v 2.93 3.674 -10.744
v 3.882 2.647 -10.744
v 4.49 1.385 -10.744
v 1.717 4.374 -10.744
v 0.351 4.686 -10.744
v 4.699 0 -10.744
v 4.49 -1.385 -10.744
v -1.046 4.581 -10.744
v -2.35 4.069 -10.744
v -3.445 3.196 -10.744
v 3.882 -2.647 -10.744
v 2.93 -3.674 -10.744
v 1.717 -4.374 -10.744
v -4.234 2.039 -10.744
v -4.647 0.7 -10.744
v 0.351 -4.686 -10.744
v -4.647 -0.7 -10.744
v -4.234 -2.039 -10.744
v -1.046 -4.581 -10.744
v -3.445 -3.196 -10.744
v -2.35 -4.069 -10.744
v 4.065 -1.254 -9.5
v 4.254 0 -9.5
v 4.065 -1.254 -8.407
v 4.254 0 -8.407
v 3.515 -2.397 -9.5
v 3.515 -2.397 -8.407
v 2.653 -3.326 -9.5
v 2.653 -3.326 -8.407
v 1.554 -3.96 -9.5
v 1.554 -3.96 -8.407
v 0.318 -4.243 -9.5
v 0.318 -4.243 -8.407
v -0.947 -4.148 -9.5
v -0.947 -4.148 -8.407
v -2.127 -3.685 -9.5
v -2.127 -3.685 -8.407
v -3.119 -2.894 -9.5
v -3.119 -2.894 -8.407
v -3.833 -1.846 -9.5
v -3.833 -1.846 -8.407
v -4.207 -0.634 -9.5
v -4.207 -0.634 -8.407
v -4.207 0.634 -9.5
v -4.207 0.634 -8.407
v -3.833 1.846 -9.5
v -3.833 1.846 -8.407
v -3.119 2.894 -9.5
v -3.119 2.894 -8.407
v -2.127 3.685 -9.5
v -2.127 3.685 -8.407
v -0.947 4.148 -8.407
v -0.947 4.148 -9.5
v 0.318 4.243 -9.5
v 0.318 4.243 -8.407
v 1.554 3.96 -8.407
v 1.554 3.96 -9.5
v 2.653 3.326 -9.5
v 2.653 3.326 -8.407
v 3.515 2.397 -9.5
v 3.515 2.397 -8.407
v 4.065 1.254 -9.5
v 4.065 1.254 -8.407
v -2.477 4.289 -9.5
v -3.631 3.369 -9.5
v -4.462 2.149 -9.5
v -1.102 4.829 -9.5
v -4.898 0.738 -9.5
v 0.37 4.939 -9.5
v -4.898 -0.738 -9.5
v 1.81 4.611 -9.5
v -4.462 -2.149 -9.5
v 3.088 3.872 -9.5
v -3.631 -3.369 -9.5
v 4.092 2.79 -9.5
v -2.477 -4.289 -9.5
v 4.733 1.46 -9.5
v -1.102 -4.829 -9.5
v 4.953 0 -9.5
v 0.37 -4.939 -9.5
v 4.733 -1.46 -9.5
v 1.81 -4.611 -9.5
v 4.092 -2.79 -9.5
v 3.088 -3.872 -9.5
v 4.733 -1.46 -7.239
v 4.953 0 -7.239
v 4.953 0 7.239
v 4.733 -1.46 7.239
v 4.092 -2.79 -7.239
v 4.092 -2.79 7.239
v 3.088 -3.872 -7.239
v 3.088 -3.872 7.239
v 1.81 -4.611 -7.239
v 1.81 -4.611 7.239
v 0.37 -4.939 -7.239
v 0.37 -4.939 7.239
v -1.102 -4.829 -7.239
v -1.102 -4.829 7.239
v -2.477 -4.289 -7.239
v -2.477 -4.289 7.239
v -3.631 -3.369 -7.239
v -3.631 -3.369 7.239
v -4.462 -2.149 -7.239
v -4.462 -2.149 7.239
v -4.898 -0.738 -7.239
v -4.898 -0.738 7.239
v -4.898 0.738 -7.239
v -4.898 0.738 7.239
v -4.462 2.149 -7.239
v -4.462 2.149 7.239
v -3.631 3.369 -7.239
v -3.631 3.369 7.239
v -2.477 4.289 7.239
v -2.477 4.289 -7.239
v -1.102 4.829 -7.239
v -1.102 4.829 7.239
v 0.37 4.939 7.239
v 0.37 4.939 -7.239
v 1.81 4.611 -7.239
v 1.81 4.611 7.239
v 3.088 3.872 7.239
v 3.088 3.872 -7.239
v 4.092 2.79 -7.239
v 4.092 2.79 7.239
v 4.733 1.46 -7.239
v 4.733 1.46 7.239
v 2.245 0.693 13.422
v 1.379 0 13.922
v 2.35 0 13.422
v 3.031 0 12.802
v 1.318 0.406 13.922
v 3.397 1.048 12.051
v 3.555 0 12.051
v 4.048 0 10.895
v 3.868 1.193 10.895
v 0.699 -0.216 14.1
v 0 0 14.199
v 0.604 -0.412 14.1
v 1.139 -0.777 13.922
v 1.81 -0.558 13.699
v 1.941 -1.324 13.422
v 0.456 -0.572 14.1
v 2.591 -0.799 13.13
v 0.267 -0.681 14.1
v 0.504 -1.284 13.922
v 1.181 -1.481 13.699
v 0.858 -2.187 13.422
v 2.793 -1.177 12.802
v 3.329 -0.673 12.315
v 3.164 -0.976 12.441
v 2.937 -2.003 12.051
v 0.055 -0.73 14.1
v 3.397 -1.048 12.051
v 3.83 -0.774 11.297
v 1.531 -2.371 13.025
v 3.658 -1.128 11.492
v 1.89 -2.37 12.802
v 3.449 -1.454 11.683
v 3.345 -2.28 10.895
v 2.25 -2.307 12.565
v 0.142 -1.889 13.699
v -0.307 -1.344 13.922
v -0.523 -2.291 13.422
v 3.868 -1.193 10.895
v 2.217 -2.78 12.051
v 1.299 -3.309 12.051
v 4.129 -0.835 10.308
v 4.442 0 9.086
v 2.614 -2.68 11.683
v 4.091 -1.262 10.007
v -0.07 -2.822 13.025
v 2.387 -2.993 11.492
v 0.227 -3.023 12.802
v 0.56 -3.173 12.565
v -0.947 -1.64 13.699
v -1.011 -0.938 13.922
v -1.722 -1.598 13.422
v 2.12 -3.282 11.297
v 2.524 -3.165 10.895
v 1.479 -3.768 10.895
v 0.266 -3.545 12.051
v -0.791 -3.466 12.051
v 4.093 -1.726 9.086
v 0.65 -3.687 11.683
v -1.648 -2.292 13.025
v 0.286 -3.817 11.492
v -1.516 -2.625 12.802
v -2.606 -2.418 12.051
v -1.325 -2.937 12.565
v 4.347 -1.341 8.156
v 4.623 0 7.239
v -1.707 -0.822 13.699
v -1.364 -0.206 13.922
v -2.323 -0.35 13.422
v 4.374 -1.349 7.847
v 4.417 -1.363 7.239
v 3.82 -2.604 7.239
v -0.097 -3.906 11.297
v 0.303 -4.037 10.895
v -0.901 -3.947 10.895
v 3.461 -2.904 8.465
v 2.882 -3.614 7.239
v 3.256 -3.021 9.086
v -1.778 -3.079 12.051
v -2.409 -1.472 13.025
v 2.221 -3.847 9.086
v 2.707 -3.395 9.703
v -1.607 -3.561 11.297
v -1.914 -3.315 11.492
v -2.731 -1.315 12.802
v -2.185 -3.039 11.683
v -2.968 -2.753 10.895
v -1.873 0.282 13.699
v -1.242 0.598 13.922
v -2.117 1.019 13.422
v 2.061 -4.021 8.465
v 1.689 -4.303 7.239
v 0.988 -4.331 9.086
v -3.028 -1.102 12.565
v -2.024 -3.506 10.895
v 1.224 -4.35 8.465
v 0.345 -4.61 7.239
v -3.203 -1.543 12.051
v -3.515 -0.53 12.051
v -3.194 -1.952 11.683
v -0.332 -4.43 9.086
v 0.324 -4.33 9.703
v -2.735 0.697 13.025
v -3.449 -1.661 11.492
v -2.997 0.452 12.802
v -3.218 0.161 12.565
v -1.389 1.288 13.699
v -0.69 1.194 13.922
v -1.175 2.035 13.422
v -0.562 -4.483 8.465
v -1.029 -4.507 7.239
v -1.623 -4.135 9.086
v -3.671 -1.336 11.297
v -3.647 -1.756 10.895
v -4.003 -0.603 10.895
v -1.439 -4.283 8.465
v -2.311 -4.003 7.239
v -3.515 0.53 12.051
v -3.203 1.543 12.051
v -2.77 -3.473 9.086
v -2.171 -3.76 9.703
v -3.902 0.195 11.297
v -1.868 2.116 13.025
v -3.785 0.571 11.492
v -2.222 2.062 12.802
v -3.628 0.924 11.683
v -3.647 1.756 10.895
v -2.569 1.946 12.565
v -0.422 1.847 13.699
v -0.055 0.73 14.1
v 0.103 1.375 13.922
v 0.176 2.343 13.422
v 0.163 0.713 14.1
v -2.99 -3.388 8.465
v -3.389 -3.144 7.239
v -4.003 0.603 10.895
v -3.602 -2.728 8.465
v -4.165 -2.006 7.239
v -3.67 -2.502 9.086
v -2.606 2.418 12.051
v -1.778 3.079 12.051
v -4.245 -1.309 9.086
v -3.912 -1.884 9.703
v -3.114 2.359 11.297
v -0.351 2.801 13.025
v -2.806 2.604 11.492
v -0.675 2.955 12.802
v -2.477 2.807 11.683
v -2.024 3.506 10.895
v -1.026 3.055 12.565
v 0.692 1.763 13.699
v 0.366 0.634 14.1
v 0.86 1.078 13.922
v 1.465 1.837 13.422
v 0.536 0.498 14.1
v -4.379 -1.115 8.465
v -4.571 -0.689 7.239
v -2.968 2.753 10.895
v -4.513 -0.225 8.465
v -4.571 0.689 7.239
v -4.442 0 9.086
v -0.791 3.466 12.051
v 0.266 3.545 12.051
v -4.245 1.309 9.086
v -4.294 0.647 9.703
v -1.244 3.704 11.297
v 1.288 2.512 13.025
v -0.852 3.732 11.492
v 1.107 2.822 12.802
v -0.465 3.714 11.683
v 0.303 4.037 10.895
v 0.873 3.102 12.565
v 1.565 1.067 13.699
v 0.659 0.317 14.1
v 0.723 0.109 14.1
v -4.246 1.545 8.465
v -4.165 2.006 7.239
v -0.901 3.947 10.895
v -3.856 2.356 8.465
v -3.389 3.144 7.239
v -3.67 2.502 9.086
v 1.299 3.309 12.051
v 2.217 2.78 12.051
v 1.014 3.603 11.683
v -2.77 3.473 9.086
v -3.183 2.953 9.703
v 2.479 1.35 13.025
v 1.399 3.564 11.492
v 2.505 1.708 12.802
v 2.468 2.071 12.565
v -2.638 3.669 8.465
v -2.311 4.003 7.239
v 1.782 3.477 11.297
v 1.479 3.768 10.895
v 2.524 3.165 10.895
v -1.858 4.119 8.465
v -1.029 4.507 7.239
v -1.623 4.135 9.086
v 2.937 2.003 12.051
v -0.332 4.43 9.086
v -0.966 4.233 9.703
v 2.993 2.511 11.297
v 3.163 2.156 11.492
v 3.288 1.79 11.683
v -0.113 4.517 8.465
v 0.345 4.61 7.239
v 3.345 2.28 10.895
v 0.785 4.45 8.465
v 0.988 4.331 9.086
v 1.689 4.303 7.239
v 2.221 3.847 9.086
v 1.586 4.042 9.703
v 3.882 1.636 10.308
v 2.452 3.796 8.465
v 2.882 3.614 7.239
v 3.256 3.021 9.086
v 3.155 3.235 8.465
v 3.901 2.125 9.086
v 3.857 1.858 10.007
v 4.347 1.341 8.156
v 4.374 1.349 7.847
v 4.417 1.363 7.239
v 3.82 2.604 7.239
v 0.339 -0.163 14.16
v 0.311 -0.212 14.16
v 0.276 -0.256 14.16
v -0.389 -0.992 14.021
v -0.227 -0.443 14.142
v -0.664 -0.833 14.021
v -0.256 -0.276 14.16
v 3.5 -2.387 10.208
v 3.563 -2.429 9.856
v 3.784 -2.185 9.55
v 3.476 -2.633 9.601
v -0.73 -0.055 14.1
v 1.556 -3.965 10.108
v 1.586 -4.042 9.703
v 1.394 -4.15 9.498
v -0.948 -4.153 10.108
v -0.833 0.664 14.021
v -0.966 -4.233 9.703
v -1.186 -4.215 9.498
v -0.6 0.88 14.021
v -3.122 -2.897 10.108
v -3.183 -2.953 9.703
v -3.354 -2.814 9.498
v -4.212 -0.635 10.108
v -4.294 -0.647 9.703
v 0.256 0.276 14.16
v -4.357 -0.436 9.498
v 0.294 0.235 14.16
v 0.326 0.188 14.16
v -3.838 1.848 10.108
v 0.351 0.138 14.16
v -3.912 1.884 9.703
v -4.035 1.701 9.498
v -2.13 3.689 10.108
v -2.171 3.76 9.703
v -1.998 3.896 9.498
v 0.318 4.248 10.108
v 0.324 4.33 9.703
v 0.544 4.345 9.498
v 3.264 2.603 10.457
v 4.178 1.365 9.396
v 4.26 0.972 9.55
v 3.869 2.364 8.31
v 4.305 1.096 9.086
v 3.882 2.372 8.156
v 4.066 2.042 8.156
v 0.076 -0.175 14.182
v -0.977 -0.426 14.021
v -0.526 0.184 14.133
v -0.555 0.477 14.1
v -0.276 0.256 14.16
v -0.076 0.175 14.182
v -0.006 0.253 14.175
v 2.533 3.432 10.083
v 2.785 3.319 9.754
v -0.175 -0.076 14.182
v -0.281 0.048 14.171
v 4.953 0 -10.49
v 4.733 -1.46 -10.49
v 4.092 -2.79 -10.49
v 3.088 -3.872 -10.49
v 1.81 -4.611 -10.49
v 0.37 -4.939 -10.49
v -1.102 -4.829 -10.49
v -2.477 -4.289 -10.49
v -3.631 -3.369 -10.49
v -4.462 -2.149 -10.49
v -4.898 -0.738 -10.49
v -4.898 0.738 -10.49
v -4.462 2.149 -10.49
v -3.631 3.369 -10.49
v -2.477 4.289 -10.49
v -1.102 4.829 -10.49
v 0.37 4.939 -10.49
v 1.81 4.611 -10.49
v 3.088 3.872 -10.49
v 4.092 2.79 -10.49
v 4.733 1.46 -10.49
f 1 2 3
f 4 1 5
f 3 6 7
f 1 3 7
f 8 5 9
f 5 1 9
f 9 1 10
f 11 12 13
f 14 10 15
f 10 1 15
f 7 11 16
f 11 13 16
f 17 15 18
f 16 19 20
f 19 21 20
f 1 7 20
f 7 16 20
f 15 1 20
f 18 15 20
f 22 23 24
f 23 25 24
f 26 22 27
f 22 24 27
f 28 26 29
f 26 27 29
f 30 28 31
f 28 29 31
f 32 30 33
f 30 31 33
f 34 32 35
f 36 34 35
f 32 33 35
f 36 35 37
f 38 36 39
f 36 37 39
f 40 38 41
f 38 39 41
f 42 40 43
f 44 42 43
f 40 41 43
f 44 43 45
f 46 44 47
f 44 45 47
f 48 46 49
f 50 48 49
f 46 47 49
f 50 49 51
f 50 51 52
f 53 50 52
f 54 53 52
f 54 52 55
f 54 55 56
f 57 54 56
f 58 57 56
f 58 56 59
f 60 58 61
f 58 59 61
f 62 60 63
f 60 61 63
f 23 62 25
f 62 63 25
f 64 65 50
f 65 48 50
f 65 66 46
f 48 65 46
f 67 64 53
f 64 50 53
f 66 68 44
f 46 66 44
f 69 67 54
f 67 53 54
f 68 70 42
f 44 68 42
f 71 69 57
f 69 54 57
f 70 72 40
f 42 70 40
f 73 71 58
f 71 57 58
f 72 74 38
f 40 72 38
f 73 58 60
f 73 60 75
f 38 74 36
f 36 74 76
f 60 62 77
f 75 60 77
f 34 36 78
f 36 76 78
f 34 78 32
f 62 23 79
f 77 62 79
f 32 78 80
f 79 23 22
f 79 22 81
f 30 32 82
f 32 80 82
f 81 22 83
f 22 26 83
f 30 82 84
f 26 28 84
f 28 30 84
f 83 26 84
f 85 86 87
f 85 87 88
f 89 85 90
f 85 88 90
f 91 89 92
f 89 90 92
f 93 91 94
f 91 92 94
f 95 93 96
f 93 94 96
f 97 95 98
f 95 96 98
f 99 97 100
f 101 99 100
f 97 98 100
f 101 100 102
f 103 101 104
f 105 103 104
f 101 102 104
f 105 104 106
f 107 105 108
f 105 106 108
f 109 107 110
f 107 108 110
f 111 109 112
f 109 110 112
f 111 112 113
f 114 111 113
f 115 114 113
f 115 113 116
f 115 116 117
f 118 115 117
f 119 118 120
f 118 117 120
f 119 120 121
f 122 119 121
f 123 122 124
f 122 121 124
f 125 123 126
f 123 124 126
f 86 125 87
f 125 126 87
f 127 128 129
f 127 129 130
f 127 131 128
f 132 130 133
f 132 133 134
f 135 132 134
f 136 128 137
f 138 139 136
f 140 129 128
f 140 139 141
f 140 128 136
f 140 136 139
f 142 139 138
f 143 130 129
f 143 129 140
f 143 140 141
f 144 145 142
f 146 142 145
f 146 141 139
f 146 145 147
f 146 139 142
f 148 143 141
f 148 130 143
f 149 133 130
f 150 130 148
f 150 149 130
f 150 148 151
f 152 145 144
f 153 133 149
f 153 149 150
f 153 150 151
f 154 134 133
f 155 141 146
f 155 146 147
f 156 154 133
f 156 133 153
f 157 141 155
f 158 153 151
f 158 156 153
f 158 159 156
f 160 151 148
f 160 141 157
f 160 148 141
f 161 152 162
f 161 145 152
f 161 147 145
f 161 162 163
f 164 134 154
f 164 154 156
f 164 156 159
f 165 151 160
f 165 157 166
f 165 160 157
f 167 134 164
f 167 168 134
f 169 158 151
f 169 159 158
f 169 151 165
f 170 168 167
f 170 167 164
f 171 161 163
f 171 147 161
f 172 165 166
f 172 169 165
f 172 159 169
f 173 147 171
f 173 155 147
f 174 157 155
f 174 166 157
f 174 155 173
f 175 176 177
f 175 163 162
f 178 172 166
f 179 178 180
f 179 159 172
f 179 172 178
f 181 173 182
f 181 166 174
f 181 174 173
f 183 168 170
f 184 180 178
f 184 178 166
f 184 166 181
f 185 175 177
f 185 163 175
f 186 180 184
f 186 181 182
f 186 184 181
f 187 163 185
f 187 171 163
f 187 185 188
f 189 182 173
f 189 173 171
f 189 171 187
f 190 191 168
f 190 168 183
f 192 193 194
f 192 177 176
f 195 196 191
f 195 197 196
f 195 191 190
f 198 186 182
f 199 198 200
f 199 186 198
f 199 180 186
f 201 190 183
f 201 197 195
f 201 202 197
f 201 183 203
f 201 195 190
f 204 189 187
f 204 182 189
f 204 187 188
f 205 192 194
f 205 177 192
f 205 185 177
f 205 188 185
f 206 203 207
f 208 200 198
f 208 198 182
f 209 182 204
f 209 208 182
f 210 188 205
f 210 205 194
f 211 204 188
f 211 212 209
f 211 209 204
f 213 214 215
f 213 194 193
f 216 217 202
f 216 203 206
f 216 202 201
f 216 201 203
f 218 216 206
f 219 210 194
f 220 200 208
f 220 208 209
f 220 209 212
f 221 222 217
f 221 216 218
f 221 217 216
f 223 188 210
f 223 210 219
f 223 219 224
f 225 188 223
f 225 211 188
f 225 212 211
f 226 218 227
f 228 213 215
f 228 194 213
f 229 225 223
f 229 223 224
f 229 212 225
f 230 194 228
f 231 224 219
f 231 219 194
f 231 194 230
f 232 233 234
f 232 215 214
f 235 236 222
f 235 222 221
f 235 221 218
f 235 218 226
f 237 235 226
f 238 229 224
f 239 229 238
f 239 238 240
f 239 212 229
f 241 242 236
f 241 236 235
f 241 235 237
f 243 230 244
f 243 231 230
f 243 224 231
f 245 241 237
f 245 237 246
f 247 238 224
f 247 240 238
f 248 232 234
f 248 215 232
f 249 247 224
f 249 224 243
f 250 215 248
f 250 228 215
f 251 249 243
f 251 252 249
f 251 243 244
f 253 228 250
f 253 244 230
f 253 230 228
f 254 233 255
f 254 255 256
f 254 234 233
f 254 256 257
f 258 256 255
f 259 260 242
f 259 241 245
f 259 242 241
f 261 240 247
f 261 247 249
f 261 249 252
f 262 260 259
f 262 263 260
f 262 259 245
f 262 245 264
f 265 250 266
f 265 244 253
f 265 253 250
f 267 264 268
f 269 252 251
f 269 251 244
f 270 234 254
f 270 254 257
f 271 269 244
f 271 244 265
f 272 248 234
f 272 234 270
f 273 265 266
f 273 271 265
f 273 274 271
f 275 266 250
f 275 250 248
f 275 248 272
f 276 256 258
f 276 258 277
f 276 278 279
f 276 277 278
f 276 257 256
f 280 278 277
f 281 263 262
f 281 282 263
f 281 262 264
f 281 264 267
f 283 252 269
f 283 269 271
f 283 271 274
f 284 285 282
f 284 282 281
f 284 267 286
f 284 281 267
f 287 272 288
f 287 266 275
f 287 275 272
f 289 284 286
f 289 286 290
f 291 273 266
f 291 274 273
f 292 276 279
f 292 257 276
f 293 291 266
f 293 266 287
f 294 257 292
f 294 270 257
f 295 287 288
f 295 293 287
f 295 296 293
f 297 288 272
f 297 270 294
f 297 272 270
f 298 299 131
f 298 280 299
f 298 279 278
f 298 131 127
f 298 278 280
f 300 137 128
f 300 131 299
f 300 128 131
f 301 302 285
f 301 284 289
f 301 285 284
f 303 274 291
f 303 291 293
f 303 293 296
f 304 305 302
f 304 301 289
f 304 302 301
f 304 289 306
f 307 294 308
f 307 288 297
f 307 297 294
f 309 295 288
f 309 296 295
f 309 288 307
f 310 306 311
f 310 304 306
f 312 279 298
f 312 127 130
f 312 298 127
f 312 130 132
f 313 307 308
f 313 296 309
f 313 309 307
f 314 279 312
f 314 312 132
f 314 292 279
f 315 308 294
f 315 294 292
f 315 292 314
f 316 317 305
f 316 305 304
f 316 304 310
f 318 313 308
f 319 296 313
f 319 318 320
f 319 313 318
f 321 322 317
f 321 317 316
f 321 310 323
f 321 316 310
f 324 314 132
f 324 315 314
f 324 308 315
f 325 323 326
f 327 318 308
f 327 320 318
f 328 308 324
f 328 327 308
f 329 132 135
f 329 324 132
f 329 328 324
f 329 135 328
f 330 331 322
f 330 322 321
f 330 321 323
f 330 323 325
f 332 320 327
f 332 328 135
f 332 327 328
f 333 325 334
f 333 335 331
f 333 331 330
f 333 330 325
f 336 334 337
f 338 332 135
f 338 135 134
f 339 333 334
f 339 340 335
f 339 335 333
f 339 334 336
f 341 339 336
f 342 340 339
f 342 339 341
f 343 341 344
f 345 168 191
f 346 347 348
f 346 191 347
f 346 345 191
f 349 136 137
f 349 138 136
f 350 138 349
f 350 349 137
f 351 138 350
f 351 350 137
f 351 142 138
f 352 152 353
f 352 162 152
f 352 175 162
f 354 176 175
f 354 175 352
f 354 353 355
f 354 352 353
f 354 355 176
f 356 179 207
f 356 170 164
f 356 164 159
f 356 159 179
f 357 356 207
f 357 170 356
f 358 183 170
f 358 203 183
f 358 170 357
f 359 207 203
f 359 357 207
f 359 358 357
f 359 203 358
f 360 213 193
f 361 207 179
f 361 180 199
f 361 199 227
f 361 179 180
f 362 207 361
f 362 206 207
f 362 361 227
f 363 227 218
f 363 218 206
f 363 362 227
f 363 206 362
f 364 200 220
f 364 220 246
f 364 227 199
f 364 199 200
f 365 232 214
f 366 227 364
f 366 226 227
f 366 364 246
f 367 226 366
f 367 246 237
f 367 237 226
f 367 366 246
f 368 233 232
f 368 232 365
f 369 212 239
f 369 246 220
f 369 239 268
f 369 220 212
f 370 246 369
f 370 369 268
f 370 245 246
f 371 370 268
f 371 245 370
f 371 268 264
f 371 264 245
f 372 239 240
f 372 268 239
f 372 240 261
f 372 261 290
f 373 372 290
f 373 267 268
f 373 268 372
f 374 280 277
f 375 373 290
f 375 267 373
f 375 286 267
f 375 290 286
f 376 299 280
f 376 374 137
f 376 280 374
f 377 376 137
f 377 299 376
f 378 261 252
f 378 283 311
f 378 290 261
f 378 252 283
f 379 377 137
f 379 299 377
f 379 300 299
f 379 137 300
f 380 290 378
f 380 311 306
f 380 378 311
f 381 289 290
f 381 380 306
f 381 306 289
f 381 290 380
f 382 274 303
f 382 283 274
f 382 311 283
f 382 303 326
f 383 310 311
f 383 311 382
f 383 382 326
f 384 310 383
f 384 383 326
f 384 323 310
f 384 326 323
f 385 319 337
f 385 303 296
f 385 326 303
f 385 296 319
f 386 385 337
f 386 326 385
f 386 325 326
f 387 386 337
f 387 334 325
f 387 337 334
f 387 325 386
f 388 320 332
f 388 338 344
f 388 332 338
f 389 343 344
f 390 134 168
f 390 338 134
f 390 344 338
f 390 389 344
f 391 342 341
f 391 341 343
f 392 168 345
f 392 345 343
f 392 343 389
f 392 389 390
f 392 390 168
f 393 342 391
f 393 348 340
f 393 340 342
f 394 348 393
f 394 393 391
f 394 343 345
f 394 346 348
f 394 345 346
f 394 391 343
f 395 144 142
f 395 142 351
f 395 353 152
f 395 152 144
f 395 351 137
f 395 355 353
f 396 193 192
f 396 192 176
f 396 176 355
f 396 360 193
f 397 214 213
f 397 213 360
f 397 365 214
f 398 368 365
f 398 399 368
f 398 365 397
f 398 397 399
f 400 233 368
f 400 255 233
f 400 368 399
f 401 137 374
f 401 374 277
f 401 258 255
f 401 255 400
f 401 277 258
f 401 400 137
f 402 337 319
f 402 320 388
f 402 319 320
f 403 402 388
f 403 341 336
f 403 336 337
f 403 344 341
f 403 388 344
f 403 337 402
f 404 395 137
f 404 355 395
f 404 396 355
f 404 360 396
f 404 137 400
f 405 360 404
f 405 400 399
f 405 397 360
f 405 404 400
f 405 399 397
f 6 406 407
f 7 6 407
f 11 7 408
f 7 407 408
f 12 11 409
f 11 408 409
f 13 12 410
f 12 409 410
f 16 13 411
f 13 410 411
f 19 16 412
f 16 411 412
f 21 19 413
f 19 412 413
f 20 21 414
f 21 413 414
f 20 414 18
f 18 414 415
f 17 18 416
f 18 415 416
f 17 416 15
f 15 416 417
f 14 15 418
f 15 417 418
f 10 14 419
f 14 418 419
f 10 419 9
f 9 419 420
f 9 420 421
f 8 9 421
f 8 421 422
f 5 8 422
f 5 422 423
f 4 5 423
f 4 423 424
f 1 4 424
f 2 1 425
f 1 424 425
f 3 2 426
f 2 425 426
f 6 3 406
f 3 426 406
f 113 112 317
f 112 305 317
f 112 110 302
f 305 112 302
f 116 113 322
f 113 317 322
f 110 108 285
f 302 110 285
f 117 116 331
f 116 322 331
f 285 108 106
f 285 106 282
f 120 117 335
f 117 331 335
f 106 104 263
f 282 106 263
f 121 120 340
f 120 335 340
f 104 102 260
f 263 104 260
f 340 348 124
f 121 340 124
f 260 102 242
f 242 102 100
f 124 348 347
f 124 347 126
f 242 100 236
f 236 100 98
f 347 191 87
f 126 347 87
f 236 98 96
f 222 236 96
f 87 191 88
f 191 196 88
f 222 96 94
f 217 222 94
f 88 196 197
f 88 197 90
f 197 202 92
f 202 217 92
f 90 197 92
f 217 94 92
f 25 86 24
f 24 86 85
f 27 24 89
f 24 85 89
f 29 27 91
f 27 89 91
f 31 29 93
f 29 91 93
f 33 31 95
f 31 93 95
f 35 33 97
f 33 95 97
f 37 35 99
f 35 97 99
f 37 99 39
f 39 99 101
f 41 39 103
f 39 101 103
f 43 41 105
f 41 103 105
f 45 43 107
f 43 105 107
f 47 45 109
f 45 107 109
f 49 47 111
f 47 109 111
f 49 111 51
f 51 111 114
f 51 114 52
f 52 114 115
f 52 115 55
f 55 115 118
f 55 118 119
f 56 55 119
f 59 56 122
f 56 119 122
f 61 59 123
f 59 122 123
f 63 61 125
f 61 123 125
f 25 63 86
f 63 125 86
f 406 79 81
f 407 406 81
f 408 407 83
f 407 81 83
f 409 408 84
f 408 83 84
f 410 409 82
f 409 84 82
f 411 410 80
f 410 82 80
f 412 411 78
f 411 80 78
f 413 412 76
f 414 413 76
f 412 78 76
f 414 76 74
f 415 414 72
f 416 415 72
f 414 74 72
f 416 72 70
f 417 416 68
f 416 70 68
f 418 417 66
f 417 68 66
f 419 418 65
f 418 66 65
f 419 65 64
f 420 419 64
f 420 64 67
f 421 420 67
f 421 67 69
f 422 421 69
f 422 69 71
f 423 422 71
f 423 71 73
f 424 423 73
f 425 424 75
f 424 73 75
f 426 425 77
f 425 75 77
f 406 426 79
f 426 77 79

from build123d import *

# Parameters (mm, degrees)
F0_W    = 4.2545
F0_H    = 1.0922
F2_SIZE = 0.254


with BuildPart() as f1:
    # F0 (on Front) → F1 (revolve)
    with BuildSketch(Plane.XZ):
        with BuildLine():
            Line((0, 14.1986), (0, 7.239))
            Line((0, 7.239), (4.6228, 7.239))
            add(Edge.make_bspline(
                [(0, 14.1986), (3.952446, 13.911695), (4.413521, 10.257011), (4.6228, 7.239)],
                knots=[0, 0, 0, 0, 8.355017, 8.355017, 8.355017, 8.355017], degree=3))
        make_face()
        Polygon((0, -7.239), (4.953, -7.239), (4.953, 7.239), (4.6228, 7.239), (0, 7.239), align=None)
        Polygon((4.2545, -8.4074), (4.953, -7.239), (0, -7.239), (0, -8.4074), align=None)
        with Locations((2.12725, -8.9535)):
            Rectangle(F0_W, F0_H)
        Polygon((4.953, -9.4996), (4.2545, -9.4996), (0, -9.4996), (0, -10.7442), (4.953, -10.7442), align=None)
    revolve(axis=Axis((0, 0, 0), (0, 0, -1)))

    # F2
    f2_edges = [f1.edges().sort_by_distance(p)[0] for p in [
        (-4.953, 0, -10.7442),
    ]]
    chamfer(f2_edges, length=F2_SIZE)


solid = f1.part
